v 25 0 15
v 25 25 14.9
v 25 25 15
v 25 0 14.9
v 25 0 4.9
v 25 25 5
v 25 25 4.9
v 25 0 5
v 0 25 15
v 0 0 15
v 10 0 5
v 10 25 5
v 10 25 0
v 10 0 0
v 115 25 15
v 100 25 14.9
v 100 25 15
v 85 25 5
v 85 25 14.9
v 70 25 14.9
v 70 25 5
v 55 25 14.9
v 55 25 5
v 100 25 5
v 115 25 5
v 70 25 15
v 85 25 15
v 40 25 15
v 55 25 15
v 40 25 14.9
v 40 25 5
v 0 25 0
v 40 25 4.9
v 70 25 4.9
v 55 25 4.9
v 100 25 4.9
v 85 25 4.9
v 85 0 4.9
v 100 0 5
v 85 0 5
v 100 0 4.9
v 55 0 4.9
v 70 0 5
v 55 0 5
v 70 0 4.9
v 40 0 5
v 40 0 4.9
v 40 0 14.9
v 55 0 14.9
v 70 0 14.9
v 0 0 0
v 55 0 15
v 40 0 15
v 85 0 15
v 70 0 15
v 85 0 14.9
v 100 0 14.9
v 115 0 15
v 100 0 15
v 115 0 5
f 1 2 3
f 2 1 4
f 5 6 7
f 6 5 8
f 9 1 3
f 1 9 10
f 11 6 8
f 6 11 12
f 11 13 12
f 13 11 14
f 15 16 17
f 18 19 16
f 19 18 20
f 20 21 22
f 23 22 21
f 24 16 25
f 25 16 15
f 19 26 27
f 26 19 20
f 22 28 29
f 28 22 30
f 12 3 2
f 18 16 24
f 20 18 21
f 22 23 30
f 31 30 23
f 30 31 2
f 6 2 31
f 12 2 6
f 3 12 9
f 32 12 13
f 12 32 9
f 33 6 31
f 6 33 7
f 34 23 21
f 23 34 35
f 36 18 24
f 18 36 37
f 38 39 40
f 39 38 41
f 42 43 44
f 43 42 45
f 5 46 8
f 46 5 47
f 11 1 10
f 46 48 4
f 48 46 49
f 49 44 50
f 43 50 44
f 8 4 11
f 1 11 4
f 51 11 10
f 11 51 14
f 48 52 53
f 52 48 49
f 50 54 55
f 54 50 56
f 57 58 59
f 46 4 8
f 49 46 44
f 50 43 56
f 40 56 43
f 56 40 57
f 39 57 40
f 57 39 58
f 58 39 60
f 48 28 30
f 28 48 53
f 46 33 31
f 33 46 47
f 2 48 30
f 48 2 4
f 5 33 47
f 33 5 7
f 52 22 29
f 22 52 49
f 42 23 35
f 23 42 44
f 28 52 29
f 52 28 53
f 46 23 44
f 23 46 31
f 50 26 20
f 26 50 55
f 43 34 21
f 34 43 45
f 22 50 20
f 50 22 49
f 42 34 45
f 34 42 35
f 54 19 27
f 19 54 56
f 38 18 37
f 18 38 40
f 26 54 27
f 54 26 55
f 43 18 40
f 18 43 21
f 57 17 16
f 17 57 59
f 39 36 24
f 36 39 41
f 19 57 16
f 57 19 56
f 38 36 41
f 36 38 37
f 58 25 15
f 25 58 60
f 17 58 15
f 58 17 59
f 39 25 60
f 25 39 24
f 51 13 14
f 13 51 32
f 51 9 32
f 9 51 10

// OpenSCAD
y = 25;

base_x = 10;
step_x = 15;

start_z = 5;
z_thickness = 10;

num_steps = 6;

function x(i) = base_x + i * step_x;
function z(i) = start_z - 0.1 * (i % 2);

union() {
  cube([base_x, y, start_z + z_thickness]);
  for(i = [0 : num_steps]) {
    translate([x(i), 0, z(i)])
    cube([ step_x, y, z_thickness], false);
  }
}
